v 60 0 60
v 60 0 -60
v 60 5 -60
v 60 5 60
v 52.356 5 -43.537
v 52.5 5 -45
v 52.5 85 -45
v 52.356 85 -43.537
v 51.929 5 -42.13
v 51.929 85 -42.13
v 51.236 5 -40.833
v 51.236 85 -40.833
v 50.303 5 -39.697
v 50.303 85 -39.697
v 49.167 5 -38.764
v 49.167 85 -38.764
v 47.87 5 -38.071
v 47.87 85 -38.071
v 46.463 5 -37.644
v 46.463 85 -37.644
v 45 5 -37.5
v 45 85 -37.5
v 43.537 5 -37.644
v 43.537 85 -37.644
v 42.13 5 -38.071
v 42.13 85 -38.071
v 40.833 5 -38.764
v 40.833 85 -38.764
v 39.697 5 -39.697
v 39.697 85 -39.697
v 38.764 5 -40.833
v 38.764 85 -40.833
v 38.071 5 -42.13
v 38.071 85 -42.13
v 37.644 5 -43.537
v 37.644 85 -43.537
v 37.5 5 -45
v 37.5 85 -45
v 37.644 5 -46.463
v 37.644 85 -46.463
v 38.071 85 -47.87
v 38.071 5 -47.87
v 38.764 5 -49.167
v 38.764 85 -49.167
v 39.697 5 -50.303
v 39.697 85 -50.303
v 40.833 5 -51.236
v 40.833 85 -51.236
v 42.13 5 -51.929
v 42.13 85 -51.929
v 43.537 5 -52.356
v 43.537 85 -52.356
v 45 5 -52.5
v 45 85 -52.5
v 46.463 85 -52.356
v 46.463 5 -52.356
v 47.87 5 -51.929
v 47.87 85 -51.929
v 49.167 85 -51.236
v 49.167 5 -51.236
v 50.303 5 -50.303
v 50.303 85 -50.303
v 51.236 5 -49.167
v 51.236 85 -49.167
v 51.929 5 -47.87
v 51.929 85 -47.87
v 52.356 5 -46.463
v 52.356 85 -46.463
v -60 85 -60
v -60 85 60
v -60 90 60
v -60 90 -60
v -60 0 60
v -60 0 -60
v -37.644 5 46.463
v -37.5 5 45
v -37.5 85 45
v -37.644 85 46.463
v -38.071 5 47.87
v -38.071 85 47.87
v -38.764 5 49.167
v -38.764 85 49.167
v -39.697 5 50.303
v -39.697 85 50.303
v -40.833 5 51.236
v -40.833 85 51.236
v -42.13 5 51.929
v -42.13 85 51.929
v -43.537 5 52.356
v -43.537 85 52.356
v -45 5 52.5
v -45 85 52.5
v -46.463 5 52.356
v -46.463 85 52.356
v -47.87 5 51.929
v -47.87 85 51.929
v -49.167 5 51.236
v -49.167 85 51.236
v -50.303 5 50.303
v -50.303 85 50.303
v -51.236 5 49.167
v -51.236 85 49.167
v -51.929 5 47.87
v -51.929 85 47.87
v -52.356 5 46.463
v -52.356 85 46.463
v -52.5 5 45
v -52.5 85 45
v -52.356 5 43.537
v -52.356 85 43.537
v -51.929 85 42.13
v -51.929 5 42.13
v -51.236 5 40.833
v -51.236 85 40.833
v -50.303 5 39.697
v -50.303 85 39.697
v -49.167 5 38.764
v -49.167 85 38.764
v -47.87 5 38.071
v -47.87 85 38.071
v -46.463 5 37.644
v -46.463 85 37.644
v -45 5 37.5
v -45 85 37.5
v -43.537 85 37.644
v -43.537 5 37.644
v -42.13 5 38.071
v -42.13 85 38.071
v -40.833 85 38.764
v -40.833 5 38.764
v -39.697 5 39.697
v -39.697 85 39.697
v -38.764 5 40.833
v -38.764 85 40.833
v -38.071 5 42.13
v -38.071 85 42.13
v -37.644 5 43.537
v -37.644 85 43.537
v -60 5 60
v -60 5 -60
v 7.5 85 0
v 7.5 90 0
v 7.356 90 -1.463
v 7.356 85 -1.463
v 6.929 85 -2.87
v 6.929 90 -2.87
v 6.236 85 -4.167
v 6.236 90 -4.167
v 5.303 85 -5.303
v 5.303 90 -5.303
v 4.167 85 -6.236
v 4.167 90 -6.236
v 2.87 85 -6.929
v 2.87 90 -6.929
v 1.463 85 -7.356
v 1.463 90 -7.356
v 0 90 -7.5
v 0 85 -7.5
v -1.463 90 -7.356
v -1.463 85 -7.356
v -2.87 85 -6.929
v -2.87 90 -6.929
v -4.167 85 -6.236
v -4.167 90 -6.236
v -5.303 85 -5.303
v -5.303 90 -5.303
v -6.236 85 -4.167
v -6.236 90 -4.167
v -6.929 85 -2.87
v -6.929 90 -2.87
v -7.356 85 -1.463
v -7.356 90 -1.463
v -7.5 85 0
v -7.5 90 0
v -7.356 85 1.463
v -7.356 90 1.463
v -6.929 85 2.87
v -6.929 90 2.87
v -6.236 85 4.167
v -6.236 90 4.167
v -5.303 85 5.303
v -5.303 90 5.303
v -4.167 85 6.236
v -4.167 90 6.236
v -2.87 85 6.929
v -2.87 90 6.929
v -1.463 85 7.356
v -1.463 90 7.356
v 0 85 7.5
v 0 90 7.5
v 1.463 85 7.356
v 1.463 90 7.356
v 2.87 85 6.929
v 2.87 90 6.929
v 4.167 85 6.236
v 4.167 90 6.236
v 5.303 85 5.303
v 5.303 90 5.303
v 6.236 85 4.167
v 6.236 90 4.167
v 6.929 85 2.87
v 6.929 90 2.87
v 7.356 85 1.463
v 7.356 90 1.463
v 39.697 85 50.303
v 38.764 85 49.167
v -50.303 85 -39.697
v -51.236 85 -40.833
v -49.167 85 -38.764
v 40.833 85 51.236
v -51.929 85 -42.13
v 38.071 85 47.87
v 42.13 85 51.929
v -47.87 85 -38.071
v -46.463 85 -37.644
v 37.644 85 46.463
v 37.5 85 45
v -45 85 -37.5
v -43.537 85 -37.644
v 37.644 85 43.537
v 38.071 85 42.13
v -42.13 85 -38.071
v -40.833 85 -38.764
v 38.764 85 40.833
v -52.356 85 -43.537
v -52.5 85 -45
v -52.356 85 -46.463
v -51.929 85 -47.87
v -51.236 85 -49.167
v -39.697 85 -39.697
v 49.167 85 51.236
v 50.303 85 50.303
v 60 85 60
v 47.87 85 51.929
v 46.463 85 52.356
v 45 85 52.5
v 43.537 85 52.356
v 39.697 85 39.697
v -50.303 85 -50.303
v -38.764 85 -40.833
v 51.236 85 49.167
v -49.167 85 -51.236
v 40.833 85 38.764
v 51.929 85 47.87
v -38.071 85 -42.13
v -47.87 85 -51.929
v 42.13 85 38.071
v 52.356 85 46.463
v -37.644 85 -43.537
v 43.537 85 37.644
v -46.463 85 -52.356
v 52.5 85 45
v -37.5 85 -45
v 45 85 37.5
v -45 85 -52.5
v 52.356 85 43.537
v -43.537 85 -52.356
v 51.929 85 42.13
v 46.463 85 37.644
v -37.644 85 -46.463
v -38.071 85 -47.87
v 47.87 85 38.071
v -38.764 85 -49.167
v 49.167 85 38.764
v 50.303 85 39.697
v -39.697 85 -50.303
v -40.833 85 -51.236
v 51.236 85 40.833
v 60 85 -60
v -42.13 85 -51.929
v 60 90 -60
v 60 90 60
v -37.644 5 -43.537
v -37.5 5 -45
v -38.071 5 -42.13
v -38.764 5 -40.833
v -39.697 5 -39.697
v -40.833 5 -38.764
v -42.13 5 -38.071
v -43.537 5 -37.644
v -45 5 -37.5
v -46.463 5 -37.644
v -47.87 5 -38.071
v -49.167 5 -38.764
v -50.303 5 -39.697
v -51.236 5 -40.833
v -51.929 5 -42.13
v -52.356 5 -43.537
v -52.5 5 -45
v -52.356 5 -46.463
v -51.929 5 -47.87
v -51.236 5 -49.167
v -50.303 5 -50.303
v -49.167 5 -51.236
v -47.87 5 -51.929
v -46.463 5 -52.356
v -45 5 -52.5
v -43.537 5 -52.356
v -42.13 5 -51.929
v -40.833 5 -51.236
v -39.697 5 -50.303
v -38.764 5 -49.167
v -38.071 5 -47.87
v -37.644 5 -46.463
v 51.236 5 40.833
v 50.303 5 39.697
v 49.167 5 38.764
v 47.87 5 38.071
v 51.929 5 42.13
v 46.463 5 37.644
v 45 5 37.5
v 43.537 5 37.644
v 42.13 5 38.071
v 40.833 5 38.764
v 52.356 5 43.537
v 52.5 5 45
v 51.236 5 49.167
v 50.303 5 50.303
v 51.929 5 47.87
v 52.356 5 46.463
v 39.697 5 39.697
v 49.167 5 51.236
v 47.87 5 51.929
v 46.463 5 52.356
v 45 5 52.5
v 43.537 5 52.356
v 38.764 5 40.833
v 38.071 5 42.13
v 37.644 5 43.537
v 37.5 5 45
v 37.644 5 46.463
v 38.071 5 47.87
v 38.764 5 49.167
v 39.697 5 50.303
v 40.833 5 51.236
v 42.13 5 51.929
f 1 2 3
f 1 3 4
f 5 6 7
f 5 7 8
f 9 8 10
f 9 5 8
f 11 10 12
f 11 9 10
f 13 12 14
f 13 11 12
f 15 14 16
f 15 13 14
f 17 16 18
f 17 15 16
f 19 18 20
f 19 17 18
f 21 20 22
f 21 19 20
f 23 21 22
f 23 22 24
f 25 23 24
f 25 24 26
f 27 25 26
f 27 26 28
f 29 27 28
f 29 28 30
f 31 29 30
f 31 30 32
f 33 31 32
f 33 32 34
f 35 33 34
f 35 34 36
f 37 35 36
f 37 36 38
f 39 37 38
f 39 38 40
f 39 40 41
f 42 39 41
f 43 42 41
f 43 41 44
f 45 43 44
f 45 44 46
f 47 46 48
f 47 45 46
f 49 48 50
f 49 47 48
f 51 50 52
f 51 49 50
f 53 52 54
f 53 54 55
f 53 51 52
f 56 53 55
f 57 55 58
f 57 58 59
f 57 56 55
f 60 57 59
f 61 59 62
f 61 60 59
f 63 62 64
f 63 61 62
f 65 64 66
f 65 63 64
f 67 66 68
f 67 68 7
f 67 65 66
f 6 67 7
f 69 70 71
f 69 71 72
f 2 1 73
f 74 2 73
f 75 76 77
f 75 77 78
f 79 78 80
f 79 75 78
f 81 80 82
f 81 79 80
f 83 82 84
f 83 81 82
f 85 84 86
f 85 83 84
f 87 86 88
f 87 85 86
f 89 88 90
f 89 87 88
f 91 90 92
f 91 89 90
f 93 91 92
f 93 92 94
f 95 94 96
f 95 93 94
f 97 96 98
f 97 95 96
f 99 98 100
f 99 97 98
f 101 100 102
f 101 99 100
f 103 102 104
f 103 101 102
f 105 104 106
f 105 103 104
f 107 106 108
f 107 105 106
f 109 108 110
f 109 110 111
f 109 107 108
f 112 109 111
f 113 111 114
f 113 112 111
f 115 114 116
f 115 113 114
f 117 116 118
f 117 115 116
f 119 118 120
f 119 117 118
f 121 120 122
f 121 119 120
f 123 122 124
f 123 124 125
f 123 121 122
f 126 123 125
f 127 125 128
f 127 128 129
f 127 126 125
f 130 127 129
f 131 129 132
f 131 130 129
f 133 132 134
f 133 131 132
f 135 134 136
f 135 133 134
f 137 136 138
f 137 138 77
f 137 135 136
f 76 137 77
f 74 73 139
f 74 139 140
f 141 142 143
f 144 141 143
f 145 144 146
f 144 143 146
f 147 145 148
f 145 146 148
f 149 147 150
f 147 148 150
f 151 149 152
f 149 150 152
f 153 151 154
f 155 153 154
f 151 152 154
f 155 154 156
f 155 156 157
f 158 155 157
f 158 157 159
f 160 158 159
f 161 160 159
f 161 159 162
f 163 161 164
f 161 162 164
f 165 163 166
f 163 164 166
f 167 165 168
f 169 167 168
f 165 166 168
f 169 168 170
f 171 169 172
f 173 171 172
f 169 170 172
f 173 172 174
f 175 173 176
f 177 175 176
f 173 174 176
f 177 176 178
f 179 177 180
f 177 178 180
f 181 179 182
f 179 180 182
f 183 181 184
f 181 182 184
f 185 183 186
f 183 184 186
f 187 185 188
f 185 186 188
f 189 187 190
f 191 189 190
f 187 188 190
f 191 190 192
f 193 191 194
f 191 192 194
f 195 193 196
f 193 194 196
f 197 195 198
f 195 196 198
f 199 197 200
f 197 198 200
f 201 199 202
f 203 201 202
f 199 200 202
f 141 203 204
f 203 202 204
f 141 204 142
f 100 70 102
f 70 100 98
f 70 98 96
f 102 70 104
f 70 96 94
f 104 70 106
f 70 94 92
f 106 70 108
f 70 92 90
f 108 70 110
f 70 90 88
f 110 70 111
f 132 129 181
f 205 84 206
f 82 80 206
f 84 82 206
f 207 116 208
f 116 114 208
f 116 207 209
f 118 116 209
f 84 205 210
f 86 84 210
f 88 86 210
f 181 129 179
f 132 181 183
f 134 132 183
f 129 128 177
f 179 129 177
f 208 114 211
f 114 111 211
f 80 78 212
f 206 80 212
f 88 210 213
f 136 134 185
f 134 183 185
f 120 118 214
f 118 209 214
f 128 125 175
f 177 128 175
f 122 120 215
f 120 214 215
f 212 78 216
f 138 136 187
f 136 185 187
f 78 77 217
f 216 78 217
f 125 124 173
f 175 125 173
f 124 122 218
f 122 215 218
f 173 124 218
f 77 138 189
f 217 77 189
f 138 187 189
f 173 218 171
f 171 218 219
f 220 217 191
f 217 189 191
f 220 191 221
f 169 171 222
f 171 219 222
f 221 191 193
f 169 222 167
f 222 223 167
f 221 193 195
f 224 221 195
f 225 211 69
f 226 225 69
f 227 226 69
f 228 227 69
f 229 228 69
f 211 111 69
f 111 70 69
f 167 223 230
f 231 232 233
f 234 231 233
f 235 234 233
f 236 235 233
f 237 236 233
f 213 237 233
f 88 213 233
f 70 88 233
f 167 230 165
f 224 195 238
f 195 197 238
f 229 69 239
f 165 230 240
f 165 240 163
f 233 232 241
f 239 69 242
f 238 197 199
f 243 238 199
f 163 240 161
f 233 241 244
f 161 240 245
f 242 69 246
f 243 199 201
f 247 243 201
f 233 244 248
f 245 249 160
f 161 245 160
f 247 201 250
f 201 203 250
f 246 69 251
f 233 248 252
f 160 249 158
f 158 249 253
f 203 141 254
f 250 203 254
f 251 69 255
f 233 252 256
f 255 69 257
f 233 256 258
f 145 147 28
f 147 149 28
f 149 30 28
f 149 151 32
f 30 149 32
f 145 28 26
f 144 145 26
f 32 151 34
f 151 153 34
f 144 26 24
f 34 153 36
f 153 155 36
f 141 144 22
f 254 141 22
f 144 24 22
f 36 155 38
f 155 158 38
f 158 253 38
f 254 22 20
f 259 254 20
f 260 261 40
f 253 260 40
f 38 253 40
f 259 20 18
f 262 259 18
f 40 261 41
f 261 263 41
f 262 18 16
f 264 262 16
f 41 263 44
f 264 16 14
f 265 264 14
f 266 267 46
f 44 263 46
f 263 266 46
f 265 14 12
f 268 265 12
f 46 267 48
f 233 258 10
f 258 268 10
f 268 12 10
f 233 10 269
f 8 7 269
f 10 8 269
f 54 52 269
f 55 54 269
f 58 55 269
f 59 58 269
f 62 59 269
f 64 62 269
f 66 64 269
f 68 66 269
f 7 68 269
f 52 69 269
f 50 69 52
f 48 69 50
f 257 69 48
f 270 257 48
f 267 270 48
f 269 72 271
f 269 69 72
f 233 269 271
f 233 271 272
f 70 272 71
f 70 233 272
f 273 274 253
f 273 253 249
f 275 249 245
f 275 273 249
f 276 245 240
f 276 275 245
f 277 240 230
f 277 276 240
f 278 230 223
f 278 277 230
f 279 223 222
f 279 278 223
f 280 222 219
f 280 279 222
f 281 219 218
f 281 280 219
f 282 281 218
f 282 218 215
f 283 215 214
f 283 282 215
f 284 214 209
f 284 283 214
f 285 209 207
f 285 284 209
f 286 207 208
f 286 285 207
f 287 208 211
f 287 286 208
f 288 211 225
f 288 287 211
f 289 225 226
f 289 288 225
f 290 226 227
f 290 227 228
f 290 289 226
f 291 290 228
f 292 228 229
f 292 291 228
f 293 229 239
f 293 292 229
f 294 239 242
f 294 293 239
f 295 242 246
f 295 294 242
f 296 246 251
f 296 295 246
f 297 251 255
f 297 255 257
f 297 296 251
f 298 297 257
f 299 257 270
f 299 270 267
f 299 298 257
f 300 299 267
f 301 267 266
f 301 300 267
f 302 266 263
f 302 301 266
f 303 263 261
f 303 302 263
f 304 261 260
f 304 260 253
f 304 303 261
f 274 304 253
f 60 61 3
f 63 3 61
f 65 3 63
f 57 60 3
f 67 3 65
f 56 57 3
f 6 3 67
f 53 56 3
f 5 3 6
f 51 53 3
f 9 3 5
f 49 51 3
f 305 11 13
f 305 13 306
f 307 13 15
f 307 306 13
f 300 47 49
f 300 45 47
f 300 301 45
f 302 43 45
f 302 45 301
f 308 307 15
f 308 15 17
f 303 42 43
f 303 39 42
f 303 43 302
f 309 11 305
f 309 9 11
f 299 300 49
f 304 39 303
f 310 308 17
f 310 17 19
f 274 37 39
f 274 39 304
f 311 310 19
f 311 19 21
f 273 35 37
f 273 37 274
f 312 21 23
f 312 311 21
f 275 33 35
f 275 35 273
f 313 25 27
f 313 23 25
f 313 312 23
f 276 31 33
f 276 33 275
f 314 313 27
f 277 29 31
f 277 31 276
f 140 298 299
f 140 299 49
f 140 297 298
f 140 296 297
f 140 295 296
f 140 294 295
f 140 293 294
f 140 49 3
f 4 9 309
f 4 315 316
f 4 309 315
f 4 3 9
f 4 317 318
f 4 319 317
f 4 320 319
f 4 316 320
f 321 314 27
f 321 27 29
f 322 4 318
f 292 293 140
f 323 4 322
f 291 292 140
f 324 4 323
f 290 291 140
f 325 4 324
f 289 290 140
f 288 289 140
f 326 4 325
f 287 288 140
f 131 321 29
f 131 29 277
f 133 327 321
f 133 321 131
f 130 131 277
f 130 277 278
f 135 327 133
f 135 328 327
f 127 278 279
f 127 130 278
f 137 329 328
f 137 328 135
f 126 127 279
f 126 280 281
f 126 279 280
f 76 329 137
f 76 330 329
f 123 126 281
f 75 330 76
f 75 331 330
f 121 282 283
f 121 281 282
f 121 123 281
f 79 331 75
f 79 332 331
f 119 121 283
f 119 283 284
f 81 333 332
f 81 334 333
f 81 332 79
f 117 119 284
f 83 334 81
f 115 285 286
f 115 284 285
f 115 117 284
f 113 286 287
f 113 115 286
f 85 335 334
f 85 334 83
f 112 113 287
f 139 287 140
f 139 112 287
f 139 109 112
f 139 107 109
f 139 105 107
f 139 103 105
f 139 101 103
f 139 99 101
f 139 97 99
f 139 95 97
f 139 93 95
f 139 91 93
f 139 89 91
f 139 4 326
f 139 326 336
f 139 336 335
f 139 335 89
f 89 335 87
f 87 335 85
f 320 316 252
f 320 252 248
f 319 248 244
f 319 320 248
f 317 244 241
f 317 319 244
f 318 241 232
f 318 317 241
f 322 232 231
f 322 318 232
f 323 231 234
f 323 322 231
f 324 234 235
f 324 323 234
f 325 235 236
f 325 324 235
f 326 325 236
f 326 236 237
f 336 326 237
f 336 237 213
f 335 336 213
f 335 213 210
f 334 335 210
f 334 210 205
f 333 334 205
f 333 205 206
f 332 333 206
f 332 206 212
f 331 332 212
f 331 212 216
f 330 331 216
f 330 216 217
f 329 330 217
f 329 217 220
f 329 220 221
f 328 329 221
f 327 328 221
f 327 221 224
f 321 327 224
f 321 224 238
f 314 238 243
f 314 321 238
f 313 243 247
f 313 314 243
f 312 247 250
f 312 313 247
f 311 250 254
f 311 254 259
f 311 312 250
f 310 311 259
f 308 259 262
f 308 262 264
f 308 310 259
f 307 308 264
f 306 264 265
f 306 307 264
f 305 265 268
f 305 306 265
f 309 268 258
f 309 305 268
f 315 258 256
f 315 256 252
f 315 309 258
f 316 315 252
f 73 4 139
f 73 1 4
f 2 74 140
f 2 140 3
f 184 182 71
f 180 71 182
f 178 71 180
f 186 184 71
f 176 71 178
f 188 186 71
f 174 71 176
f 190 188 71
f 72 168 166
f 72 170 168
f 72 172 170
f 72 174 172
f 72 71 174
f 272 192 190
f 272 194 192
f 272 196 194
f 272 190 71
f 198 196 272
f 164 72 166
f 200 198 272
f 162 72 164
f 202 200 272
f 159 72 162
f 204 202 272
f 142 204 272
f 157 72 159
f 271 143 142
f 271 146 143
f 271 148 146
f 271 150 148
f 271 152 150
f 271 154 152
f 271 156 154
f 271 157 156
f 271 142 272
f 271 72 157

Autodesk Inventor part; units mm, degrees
ref_plane "YZ Plane" through (0, 0, 0) normal (1, 0, 0) x (0, 1, 0)
ref_plane "XZ Plane" through (0, 0, 0) normal (0, 1, 0) x (-1, 0, 0)
ref_plane "XY Plane" through (0, 0, 0) normal (0, 0, 1) x (1, 0, 0)
sketch "Boceto1" plane through (0, 0, 0) normal (0, 1, 0) x (-1, 0, 0)
  line L0 (60, -60) -> (-60, -60)
  line L1 (-60, -60) -> (-60, 60)
  line L2 (-60, 60) -> (60, 60)
  line L3 (60, 60) -> (60, -60)
  line L4 (60, -60) -> (-60, 60) construction
  line L5 (-60, -60) -> (60, 60) construction
  point P0 (0, 0)
  dimension "d0" = 120
  dimension "d1" = 120
extrude "Extrusión1" add sketch "Boceto1" along normal blind 5
sketch "Boceto2" plane through (0, 5, 0) normal (0, 1, 0) x (1, 0, 0)
  line L0 (45, -45) -> (-45, -45)
  line L1 (-45, -45) -> (-45, 45)
  line L2 (-45, 45) -> (45, 45)
  line L3 (45, 45) -> (45, -45)
  line L4 (45, -45) -> (-45, 45) construction
  line L5 (-45, -45) -> (45, 45) construction
  circle A0 centre (-45, 45) radius 7.5
  circle A1 centre (45, 45) radius 7.5
  circle A2 centre (-45, -45) radius 7.5
  circle A3 centre (45, -45) radius 7.5
  point P0 (0, 0)
  dimension "d4" = 90
  dimension "d5" = 90
  dimension "d6" = 15
  dimension "d7" = 15
  dimension "d8" = 15
  dimension "d9" = 15
extrude "Extrusión2" add sketch "Boceto2" along normal blind 80 contours A2 L1 L0 | L0 L1 A2 | A3 L3 L0 | L0 L3 A3 | A0 L2 L1 | L1 L2 A0 | A1 L2 L3 | L3 L2 A1
sketch "Boceto3" plane through (-45, 85, 45) normal (0, 1, 0) x (1, 0, 0)
  circle A0 centre (90, 90) radius 7.5 projected
  line L0 (90, 90) -> (-30, 90)
  line L1 (-30, 90) -> (-30, -30)
  line L2 (-30, -30) -> (90, -30)
  line L3 (90, -30) -> (90, 90)
  line L4 (-15, 105) -> (105, 105)
  line L5 (105, 105) -> (105, -15)
  line L6 (105, -15) -> (-15, -15)
  line L7 (-15, -15) -> (-15, 105)
  line L8 (-15, 105) -> (105, -15) construction
  line L9 (105, 105) -> (-15, -15) construction
  point P0 (45, 45)
  dimension "d12" = 120
  dimension "d13" = 120
extrude "Extrusión3" add sketch "Boceto3" along normal blind 5 contours A0 L3 L0 | A0 L0 L7 L4 L5 L6 L3 | L0 L3 A0 | A0 L3 L6 L7 L0
sketch "Boceto4" plane through (-45, 90, 45) normal (0, 1, 0) x (1, 0, 0)
  circle A0 centre (45, 45) radius 7.5
  dimension "d16" = 15
extrude "Extrusión4" cut sketch "Boceto4" against normal blind 10
properties part number "Central_base" material "Plástico ABS"
